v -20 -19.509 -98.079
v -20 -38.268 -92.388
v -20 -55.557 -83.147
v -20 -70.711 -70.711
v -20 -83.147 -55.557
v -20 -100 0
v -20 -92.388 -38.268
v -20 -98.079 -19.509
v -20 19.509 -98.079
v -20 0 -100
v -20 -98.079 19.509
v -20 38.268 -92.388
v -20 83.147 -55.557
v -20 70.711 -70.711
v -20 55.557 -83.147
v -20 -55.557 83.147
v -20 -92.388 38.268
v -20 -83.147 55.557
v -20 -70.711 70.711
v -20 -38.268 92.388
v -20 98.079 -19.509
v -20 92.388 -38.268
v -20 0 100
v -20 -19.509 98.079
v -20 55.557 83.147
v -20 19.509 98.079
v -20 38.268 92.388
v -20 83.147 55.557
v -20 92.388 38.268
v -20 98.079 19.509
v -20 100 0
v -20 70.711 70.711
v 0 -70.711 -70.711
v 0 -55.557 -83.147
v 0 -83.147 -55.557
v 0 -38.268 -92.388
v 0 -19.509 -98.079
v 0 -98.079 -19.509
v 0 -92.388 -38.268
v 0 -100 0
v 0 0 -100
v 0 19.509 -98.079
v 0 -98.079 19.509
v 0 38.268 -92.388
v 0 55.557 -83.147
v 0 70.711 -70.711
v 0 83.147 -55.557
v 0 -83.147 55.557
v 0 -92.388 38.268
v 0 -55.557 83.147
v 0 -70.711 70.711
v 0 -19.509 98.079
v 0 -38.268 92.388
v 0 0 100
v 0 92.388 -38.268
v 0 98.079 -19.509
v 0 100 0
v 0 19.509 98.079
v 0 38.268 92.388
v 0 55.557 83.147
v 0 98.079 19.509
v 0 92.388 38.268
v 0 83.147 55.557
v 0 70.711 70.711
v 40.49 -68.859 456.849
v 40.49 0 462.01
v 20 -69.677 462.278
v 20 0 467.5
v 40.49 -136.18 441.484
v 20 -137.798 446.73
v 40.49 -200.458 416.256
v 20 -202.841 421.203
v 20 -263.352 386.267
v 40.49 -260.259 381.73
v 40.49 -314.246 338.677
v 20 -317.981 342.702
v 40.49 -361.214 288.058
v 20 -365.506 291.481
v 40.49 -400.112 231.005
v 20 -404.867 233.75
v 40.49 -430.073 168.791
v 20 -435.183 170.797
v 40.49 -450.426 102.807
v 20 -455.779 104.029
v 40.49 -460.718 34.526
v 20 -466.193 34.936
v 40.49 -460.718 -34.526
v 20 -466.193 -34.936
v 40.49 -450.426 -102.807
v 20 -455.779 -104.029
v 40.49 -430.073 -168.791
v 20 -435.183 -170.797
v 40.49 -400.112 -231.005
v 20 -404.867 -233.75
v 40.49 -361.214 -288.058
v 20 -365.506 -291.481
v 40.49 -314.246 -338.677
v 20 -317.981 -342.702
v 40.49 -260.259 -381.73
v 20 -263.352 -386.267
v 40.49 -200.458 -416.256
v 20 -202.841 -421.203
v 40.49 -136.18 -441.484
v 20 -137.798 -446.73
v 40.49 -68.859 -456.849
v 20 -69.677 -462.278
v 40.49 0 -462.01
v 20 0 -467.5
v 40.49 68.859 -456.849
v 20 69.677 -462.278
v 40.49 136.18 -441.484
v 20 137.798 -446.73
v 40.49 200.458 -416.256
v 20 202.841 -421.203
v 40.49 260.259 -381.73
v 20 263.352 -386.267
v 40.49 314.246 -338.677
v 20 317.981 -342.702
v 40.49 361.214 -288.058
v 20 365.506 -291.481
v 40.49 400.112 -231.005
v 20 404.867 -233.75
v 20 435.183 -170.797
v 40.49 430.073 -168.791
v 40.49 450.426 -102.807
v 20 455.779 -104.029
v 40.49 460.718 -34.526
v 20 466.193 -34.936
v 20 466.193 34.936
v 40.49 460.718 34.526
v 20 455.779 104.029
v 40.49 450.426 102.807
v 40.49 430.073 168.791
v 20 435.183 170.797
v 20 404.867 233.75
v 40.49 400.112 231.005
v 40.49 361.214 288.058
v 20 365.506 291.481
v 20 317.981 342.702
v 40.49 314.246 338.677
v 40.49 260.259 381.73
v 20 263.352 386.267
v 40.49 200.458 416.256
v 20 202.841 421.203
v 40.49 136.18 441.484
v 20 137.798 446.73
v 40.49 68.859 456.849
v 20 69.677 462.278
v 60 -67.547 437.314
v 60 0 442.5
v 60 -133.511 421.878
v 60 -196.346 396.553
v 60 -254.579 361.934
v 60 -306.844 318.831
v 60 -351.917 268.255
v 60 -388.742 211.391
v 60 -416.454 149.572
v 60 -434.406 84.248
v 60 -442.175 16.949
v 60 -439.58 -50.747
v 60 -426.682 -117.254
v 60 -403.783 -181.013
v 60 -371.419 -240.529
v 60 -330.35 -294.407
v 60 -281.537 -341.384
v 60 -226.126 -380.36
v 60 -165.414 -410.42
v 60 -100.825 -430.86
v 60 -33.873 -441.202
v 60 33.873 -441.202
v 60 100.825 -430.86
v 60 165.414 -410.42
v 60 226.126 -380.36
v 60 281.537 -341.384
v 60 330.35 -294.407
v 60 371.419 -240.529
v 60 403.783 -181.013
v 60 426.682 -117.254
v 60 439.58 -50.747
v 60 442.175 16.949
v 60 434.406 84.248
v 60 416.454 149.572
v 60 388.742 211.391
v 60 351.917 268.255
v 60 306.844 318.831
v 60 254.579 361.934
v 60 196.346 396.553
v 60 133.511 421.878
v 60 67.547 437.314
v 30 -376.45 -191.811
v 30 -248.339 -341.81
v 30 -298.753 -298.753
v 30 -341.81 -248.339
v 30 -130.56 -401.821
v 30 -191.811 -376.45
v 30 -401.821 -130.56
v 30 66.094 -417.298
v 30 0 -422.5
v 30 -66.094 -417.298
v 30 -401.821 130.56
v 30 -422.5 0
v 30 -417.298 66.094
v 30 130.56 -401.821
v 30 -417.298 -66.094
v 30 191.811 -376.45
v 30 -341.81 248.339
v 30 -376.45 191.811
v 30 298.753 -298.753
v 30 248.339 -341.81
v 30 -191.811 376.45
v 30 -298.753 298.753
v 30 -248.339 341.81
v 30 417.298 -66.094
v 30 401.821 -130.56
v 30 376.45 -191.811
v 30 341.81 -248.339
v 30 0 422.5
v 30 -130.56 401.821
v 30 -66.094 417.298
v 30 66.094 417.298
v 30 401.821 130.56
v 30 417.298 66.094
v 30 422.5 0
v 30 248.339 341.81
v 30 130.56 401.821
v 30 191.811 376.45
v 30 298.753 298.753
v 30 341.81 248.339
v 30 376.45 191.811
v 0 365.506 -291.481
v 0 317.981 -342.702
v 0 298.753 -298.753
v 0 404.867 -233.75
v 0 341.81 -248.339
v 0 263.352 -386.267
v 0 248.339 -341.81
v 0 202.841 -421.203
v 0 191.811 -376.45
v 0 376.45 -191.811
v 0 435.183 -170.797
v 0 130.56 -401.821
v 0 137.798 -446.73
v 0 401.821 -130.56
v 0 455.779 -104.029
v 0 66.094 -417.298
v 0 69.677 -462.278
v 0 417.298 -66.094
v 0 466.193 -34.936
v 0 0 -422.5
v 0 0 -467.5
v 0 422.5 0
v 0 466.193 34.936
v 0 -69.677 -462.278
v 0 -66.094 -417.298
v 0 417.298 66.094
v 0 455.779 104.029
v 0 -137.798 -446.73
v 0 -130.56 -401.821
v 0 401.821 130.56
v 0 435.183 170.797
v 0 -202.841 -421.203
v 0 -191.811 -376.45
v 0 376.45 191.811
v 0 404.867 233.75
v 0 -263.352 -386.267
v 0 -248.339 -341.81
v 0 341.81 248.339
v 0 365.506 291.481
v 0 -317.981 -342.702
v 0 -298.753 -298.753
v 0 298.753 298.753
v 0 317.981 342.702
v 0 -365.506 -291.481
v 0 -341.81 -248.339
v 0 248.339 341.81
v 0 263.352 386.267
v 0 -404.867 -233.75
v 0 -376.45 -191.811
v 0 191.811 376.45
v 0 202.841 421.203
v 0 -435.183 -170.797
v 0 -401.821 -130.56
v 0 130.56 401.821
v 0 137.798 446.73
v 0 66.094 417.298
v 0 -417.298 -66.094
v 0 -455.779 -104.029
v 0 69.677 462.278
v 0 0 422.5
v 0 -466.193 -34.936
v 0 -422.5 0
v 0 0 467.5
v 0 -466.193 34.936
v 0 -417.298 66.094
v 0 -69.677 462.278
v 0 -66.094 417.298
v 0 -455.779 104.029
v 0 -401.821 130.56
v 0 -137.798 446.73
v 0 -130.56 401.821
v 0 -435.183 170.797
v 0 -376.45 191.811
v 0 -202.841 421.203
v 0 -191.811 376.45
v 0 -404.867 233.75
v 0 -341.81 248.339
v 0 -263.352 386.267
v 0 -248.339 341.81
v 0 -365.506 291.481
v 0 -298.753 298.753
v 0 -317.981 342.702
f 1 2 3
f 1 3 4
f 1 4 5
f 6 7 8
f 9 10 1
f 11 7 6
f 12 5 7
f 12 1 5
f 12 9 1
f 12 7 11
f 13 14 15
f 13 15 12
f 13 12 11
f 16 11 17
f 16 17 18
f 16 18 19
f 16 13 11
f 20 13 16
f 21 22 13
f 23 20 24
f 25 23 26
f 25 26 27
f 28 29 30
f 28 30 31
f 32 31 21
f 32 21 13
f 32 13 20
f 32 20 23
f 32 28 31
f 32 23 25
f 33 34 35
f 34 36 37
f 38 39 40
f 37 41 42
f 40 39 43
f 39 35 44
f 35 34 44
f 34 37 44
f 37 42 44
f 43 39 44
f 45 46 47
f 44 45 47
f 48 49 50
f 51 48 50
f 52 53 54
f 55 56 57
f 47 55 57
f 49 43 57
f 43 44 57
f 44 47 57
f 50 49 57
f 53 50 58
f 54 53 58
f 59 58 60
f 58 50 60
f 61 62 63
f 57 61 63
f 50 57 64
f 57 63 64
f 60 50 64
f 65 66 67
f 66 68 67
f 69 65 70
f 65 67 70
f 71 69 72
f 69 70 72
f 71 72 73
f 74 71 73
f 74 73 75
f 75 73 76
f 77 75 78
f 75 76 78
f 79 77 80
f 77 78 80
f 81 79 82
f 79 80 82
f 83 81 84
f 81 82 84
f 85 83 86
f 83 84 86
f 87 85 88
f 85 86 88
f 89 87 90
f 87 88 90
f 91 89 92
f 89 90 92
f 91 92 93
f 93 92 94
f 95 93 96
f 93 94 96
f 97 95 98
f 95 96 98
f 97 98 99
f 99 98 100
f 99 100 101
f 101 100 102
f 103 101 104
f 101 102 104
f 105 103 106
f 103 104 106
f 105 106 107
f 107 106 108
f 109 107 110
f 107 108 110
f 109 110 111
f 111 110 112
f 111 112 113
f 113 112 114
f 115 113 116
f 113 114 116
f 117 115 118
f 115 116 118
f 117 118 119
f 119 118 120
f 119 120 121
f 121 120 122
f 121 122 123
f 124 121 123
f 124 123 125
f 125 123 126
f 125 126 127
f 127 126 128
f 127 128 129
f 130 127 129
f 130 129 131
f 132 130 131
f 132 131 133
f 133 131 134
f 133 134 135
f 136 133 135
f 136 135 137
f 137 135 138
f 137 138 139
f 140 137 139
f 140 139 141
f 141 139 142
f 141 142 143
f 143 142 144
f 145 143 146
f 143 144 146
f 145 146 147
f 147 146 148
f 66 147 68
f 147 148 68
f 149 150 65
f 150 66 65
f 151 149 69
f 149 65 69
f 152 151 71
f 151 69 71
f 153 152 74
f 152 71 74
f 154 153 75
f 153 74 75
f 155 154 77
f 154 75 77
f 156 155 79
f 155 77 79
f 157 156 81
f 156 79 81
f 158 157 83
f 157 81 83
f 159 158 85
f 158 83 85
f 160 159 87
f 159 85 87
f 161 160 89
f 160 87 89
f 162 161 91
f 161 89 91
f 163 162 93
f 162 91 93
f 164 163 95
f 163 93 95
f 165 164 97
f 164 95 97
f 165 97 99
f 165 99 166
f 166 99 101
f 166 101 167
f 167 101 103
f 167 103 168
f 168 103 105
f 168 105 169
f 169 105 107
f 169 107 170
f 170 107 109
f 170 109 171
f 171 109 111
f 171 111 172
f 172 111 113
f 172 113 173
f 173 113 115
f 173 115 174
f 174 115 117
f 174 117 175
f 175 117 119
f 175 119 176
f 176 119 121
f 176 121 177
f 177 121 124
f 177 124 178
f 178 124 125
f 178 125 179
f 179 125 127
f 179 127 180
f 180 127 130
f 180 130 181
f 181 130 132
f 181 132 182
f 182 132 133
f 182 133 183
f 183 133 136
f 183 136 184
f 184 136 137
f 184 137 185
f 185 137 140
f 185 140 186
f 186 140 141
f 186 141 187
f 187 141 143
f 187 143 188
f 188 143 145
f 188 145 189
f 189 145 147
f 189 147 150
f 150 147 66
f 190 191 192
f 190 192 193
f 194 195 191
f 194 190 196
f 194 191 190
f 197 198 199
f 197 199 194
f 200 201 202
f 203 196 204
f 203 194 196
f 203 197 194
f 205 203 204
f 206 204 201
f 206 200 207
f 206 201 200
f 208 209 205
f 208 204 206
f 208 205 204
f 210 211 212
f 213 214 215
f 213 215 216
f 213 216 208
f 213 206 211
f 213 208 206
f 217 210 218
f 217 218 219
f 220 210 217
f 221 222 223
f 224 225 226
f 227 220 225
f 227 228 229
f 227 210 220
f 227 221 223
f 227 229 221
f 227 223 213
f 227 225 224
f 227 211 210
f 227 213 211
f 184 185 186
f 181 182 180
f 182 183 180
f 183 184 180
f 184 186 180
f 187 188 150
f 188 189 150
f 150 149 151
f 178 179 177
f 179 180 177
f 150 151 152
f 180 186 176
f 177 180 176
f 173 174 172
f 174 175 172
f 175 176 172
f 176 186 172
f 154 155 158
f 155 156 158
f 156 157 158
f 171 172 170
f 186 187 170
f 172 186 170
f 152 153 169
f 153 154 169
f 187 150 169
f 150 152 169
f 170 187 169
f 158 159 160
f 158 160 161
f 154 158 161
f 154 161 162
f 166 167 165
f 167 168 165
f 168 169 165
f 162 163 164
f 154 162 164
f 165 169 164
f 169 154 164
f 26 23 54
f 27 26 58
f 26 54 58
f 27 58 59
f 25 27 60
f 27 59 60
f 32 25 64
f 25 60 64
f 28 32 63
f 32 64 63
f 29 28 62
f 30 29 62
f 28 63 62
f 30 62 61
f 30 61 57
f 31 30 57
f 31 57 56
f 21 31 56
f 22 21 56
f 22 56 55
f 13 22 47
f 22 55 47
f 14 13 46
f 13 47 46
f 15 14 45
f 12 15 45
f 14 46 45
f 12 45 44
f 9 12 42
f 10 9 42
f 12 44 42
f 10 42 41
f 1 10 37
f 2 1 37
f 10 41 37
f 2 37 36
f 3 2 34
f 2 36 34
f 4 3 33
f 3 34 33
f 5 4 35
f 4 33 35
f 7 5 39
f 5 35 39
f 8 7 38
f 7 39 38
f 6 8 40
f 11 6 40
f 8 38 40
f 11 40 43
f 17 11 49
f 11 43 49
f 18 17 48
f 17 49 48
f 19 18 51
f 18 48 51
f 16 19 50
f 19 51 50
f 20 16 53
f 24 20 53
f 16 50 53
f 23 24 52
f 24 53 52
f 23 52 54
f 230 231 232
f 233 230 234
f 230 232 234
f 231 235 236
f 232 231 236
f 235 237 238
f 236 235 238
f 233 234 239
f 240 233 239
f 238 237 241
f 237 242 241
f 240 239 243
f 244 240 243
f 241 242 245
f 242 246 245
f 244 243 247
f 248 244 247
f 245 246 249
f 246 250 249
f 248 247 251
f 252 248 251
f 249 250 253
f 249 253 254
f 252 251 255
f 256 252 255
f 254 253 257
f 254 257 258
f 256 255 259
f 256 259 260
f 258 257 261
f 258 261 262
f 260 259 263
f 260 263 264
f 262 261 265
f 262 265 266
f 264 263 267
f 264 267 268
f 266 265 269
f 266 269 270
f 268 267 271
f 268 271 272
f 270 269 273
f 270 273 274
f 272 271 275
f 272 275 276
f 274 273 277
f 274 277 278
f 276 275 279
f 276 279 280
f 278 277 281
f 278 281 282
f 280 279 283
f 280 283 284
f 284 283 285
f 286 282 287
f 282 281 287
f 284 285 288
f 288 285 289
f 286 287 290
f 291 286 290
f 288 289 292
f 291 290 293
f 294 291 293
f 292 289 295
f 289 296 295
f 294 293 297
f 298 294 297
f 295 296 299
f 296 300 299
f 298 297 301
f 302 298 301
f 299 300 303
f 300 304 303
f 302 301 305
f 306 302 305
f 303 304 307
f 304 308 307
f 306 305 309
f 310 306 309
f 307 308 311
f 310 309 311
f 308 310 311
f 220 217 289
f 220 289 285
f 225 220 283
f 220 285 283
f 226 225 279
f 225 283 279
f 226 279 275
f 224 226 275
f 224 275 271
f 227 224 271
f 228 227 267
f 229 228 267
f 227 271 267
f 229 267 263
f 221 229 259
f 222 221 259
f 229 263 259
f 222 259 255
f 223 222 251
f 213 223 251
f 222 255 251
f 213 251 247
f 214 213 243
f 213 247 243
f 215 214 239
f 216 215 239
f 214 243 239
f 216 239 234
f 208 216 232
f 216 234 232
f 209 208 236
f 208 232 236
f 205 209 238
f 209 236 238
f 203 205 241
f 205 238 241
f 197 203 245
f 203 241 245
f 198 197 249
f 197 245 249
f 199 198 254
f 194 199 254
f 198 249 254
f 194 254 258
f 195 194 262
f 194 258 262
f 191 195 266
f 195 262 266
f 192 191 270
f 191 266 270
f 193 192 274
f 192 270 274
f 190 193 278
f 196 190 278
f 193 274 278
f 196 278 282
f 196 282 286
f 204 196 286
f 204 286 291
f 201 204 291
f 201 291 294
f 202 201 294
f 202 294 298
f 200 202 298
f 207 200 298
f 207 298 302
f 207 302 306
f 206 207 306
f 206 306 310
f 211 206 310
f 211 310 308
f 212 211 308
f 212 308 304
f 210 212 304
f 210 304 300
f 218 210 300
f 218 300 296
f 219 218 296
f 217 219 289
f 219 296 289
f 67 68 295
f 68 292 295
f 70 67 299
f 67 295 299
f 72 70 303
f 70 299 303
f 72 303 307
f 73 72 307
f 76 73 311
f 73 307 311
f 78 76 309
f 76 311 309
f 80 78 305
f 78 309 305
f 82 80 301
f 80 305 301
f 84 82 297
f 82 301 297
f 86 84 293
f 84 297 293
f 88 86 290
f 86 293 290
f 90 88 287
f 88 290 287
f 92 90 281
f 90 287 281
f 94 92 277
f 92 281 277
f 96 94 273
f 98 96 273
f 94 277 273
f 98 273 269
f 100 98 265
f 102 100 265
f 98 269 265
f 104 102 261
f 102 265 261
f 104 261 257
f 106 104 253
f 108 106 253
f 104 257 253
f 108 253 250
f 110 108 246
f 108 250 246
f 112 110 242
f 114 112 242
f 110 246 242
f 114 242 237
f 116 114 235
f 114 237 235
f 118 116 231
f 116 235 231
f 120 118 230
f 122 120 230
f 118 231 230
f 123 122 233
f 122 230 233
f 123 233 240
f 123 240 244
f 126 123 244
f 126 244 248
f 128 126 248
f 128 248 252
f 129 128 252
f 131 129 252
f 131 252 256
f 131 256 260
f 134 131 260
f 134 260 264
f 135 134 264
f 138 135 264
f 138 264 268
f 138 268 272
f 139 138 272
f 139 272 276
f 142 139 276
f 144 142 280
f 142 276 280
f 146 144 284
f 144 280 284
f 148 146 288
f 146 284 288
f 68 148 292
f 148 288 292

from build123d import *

# Parameters (mm, degrees)
SKETCH2_R           = 100
BOSS_EXTRUDE1_DEPTH = 20
SKETCH3_R           = 422.5
CUT_EXTRUDE1_DEPTH  = 30


with BuildPart() as part:
    # Sketch1 → Revolve1 (revolve)
    with BuildSketch(Plane(origin=(0, 0, 0), x_dir=(1, 0, 0), z_dir=(0, 1, 0)), mode=Mode.PRIVATE) as revolve1_sk:
        Polygon((0, 0), (60, 0), (60, 442.5), (40.490381057, 462.009618943), (20, 467.5), (0, 467.5), align=None)
    revolve(revolve1_sk.sketch.rotate(Axis((0, 0, 0), (1, 0, 0)), 180), axis=Axis((0, 0, 0), (1, 0, 0)))

    # Sketch2 → Boss-Extrude1 (add)
    with BuildSketch(Plane.ZY):
        Circle(SKETCH2_R)
    extrude(amount=BOSS_EXTRUDE1_DEPTH)

    # Sketch3 → Cut-Extrude1 (cut)
    with BuildSketch(Plane.ZY):
        Circle(SKETCH3_R)
    extrude(amount=-CUT_EXTRUDE1_DEPTH, mode=Mode.SUBTRACT)


with BuildPart() as cut_extrude1_piece_1:
    # of the separate pieces the step leaves, piece 1, a body of its own (cut_extrude1_pieces)
    add(part.part.solids().sort_by_distance((60, 0, 442.5))[0])


with BuildPart() as cut_extrude1_piece_2:
    # of the separate pieces the step leaves, piece 2, a body of its own (cut_extrude1_pieces)
    add(part.part.solids().sort_by_distance((0, 0, 100))[0])


solid = Compound([cut_extrude1_piece_1.part, cut_extrude1_piece_2.part])
